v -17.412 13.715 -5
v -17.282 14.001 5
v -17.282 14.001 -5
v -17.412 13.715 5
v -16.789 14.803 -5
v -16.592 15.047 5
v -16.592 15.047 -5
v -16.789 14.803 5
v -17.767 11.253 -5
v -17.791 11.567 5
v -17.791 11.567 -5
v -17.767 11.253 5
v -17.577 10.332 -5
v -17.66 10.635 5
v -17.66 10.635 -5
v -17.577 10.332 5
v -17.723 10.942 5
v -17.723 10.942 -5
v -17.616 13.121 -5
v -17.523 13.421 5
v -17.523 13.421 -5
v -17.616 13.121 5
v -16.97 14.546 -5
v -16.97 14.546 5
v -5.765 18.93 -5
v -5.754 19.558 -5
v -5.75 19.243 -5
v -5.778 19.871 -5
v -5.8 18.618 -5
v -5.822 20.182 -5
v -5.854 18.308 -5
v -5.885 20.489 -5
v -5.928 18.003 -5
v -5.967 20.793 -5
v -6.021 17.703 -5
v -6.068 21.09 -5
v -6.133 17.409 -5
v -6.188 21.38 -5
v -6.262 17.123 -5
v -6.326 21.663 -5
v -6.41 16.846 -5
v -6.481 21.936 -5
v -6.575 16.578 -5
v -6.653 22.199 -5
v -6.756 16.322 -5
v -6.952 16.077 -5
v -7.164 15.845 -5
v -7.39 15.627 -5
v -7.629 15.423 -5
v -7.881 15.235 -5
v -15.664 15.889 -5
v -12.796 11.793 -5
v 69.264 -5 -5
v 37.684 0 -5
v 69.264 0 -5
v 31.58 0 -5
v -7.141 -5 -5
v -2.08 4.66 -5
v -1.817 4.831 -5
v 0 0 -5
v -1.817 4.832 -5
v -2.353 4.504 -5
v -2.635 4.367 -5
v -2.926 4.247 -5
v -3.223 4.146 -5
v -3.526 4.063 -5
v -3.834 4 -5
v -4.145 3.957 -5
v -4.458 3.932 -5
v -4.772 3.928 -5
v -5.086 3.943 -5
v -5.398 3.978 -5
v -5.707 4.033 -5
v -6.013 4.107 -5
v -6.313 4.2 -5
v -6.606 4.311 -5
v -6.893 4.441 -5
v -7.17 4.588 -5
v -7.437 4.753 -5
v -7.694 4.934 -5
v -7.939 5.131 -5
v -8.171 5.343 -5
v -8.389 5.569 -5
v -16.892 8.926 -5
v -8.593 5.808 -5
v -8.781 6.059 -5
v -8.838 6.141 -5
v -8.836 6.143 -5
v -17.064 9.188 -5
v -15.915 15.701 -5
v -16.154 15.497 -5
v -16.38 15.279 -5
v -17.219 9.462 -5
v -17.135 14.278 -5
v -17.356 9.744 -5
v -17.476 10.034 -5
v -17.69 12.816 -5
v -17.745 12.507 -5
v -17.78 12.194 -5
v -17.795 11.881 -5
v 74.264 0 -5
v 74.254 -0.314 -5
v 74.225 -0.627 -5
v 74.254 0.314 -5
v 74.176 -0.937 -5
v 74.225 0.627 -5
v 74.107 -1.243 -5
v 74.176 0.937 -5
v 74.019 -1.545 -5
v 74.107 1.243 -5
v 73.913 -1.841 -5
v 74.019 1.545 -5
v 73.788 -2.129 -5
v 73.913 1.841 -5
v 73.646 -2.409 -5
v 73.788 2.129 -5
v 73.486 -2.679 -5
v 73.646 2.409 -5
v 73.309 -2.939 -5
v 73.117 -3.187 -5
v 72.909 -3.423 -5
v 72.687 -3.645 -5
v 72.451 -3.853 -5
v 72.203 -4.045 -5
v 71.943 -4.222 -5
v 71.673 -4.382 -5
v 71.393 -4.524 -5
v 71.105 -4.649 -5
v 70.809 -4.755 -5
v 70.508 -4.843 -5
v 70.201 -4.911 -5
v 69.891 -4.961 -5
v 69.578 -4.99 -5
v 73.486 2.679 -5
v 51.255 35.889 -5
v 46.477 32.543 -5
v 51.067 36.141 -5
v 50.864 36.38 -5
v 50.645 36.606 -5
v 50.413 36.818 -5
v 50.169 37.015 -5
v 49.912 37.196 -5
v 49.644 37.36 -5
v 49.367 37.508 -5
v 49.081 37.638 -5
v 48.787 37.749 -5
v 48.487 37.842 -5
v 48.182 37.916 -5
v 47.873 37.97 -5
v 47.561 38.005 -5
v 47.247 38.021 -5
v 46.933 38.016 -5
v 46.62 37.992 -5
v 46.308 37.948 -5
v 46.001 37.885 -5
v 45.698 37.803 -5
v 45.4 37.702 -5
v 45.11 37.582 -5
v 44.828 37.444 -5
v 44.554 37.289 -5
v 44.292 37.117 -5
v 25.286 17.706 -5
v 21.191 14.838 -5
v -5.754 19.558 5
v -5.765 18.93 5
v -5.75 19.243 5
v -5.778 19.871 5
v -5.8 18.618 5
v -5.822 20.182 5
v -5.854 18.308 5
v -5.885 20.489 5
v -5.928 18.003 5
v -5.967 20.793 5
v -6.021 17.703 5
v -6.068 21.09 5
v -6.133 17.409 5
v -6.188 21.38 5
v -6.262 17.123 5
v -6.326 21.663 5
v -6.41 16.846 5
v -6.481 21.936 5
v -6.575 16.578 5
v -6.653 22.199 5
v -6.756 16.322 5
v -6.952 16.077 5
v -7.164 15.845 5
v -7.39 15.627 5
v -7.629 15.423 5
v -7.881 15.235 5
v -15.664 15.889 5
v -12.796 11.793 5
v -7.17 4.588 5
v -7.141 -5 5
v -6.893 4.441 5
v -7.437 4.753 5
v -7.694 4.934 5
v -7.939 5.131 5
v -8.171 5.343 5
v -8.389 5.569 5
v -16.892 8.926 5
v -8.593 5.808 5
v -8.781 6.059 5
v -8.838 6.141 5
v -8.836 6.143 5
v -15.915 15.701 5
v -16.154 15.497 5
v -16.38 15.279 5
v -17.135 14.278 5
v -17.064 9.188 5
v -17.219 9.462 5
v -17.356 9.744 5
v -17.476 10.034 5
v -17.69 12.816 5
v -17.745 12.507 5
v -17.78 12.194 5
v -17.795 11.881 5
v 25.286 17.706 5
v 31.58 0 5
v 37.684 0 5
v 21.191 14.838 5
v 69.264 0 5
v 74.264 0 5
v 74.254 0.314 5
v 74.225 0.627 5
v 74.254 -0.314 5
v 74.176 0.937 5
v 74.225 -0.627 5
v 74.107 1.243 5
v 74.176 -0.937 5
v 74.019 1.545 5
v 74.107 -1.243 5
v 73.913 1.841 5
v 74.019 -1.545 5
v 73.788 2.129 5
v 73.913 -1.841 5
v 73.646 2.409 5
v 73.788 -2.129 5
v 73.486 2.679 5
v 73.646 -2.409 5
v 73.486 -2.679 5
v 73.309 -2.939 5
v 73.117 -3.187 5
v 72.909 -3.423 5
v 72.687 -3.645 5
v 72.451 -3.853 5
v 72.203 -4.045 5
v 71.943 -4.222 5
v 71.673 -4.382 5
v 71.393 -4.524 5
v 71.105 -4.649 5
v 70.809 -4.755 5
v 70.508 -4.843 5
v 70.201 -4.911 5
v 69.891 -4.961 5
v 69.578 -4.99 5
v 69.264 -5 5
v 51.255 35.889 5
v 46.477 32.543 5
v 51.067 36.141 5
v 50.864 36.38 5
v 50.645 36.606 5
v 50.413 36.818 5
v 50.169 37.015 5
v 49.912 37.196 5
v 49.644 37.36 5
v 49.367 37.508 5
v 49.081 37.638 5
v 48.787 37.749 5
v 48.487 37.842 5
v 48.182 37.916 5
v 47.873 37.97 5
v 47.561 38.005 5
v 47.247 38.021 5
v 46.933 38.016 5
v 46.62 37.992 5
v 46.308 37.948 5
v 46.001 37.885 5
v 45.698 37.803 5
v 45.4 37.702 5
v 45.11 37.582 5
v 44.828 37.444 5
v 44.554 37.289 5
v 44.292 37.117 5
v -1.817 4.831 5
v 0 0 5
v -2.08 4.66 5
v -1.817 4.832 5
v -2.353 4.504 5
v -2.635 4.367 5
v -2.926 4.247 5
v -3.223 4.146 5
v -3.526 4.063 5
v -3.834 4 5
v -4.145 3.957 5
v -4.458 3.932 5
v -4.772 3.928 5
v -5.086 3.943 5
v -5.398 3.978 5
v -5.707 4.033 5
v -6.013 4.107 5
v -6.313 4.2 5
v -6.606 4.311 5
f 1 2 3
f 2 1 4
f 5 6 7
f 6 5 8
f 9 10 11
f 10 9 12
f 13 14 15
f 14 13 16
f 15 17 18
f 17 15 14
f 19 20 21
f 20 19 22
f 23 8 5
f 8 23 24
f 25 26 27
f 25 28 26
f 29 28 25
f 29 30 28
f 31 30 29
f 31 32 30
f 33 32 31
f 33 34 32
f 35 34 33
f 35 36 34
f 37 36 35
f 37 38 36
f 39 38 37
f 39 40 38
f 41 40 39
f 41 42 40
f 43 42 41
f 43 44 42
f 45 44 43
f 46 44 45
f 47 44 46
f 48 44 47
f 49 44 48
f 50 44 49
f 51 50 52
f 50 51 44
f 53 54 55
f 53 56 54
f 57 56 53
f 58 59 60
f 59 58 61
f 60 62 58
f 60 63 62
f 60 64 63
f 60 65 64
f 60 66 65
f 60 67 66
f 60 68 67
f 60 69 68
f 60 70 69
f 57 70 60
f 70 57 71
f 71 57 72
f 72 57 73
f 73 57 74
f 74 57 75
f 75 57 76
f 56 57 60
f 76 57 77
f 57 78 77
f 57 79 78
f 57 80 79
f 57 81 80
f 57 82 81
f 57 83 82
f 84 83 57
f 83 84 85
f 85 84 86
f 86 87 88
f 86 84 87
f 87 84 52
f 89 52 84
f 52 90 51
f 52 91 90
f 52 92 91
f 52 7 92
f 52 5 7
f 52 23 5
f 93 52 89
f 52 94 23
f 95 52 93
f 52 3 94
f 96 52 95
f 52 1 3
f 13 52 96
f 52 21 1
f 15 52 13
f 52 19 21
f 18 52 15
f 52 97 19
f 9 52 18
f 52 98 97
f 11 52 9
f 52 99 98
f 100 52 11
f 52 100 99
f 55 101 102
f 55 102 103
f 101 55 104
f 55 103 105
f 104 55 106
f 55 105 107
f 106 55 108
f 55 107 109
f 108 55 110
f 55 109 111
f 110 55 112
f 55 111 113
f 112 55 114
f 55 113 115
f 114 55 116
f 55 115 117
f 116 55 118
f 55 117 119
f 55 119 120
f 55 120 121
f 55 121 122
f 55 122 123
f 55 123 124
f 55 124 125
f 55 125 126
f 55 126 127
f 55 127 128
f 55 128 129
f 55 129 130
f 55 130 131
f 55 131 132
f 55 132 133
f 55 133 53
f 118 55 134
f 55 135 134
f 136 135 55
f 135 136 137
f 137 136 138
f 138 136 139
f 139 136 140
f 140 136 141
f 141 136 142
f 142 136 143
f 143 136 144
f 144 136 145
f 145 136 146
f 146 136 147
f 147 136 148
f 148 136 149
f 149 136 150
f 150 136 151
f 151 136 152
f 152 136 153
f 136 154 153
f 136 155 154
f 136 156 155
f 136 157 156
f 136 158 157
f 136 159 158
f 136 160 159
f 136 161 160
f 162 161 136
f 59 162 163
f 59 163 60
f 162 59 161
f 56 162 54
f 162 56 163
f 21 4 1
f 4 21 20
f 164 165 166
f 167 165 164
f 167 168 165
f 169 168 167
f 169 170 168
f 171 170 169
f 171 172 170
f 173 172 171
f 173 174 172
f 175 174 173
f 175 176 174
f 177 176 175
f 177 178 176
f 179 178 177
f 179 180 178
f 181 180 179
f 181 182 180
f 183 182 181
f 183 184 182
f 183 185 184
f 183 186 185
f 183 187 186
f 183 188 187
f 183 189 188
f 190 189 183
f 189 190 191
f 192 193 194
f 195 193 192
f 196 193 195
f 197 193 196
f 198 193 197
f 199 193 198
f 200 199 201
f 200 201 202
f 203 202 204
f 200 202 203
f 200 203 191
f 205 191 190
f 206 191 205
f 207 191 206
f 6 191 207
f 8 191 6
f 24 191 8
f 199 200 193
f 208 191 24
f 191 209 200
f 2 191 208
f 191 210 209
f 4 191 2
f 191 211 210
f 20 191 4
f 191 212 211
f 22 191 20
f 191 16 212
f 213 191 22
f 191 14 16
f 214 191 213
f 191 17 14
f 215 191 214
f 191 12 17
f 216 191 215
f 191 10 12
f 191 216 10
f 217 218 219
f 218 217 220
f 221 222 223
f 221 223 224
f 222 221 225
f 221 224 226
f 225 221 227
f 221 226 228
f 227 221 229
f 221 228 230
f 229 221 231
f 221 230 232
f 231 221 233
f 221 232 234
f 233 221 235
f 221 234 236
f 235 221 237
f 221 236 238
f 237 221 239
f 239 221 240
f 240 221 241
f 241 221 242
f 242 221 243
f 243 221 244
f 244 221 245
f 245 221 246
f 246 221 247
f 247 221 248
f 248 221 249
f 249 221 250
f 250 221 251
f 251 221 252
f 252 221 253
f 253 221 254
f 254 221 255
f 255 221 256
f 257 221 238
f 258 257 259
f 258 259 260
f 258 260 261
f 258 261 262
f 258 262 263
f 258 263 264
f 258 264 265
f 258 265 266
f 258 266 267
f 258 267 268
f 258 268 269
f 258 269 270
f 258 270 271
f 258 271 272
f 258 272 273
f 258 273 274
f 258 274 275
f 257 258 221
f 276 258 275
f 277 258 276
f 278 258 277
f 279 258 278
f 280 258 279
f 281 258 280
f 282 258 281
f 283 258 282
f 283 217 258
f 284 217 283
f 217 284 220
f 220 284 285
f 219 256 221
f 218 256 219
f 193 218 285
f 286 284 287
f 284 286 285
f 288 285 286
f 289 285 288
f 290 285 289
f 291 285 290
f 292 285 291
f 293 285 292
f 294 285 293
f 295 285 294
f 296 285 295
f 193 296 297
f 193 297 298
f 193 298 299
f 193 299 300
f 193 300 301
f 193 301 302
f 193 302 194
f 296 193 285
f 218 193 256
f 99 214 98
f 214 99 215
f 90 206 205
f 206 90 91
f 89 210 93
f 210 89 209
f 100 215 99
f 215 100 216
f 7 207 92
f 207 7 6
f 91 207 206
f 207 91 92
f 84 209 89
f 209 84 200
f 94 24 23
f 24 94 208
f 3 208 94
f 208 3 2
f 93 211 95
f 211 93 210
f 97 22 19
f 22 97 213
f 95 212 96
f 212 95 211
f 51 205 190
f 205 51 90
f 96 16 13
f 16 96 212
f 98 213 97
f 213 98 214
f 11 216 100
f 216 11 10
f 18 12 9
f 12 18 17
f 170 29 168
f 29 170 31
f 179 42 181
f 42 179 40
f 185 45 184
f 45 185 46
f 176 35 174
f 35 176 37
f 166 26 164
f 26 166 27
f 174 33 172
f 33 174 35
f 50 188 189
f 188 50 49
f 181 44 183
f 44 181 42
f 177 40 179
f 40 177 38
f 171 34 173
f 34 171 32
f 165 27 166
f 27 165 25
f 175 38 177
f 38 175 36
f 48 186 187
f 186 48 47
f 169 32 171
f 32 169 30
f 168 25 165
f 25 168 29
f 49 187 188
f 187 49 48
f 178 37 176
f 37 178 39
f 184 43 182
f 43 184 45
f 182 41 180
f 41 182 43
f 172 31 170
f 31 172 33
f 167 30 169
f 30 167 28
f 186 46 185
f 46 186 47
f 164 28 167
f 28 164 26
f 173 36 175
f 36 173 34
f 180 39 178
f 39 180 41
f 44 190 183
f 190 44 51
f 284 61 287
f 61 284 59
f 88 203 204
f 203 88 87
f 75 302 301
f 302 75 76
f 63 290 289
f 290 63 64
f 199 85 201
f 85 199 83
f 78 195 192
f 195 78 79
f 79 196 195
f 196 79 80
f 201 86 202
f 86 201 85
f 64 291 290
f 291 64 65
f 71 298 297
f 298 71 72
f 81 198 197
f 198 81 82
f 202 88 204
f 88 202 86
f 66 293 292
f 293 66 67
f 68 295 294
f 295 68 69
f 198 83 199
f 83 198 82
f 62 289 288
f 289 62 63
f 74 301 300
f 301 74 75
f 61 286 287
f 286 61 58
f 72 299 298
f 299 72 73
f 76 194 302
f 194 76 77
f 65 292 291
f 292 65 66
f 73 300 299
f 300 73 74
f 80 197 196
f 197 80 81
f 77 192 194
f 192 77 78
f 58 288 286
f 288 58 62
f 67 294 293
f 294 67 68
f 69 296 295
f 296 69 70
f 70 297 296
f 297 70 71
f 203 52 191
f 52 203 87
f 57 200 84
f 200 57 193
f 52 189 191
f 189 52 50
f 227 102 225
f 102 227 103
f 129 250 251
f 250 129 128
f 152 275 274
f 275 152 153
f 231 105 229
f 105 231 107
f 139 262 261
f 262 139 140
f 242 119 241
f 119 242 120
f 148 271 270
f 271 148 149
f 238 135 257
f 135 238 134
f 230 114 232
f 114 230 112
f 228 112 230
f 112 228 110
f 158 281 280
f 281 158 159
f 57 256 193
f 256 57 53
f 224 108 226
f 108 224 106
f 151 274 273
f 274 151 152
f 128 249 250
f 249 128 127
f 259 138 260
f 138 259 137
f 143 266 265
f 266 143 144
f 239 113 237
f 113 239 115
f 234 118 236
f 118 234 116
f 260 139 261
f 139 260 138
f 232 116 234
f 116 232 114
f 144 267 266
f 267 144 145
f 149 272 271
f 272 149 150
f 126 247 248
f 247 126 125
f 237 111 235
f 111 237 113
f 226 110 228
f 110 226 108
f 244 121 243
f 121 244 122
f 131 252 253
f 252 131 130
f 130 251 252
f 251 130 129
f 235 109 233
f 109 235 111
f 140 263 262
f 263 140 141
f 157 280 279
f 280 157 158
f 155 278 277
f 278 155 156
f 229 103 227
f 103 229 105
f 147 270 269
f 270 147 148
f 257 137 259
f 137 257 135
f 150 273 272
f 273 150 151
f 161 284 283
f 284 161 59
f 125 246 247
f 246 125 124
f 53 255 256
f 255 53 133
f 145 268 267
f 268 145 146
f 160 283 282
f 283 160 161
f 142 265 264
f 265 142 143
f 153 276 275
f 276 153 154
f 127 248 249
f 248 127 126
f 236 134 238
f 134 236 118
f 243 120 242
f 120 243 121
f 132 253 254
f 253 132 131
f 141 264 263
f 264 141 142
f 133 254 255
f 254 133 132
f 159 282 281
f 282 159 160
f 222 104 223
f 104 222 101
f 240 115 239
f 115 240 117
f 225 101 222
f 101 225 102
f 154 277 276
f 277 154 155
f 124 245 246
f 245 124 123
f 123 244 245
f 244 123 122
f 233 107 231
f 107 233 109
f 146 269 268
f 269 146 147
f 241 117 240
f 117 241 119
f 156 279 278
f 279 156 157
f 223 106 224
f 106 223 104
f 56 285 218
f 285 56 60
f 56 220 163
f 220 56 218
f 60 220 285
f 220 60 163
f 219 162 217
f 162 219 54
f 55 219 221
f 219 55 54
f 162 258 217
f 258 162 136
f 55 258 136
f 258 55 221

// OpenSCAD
$fn=100;

*translate(-[ 18.45, 25.08, 70 ])import("GeomStandBig.stl");



//configure     default Vals MacBook Retina 15"
//roundings = 5;  //  5 
//Wall thickness (mm)
wallThick = 5;  // [2:8]

//Angle (Deg)
angleDeg = 35;  // [15:50]

//Deepnes of the base(mm)
baseDeep = 220; // 

//Width of the Stand(mm)
standWidth = 10;// [2:20]

//Spacing of the Hook(mm)
hookSpace = 12; // [5:20]

// Length of the Hook(mm). Zero = No Hook
hookLen = 6;   // [30]

/* [Hidden] */
fudge = 0.1;    //0.1

subDivs = 6;

surfaceLen = cos(angleDeg) * baseDeep;
topXCord = pow(surfaceLen,2)/baseDeep;
topYCord = sqrt((baseDeep-topXCord)*topXCord);


fieldWdth = (surfaceLen-(subDivs-1)*wallThick)/subDivs;
echo(surfaceLen,fieldWdth);
echo(norm([ 144.02, 100.45, 5.00 ]));

// triangle calculations
// tan alpha = GK/AK
// cos alpha = AK/HYP
// sin alpha = GK/HYP
// b²=c*q
// a²+b²=c²
dFieldWdth = fieldWdth*2+wallThick; //double field width (adjactence side)
GK = tan(angleDeg)*fieldWdth; //opposite width of triangle to remove

dGK = tan(angleDeg)* dFieldWdth; //opposite width of the large triangle
dAK = dFieldWdth;
dHYP = dGK / sin(angleDeg); //hypotenuse width of large triangle

HYP1 = sqrt(pow(fieldWdth,2)+pow(GK,2)); //The hypotenuse of the triangle to remove
HYP2 = wallThick / cos(angleDeg);  //the hypotenuse of the small wall base, width to next triangle
GK2 = sqrt(pow(HYP2,2)-pow(wallThick,2)); //opposite width of the small tri at the base f the wall
GK3 = sin(angleDeg)*wallThick; //opposite width of small tri at the rightmost triangle
AK3 = cos(angleDeg)*wallThick;

GK4 = wallThick-AK3+fudge; //very small Tri at opener
HYP4 = GK4/sin(angleDeg);
AK4 = cos(angleDeg) * HYP4;

AK5 = GK4;
HYP5 = AK5/cos(angleDeg);

Hg = sin(angleDeg)*dFieldWdth;
q = Hg+wallThick/tan(angleDeg);
echo(GK3);
    

//base geometry
//big one
*difference(){
union(){
    hull(){
        cylinder(h=standWidth,r=wallThick, center=true);
        translate ([baseDeep,0,0]) 
            cylinder(h=standWidth,r=wallThick, center=true);
        translate ([topXCord,topYCord,0]) 
            cylinder(h=standWidth,r=wallThick, center=true);
    }

    //get translation for the hook in X dir
    AK=wallThick/tan(angleDeg);

    translate([-AK,-wallThick,-standWidth/2])
        rotate([0,0,angleDeg])       
            hook();
    translate([-AK,-wallThick,-standWidth/2]) 
        cube([AK,wallThick,standWidth]);
}


// now the recesses 
//polys
    //#1
    rotate([0,0,angleDeg]) linear_extrude(height=standWidth+fudge,center=true) polygon([[0,0],[fieldWdth,0],[fieldWdth,-GK]]);
    //#2 (tri+quad)
    translate ([HYP1+HYP2,0,0]) 
        rotate([0,0,angleDeg]) 
        linear_extrude(height=standWidth+fudge,center=true) 
            polygon([[0,0],[0,GK+GK2],[fieldWdth,GK+GK2],[fieldWdth,0],[fieldWdth,-GK]]);
    //#3 (double, opens at bottom)
    //#translate ([(HYP1+HYP2)*2+GK3,-AK3,0]) 
    translate ([(HYP1+HYP2)*2+GK3-AK4,-wallThick-fudge,0]) 
        rotate([0,0,angleDeg]) 
        linear_extrude(height=standWidth+fudge,center=true) 
            polygon([[0,0],[dFieldWdth+AK4,0],[dFieldWdth+AK4,-dGK-HYP5]]);

    //#4 (double)
    translate ([(HYP1+HYP2)*4,0,0]) rotate([0,0,angleDeg]) 
        linear_extrude(height=standWidth+fudge,center=true) 
            polygon([[0,0],[dFieldWdth,0],[dFieldWdth,-dGK]]);
            
//now the rectangles
    recDepth2=2*(GK+GK2);
    //#1
    translate([(HYP1+HYP2)*2,0,-(standWidth+fudge)/2])
        rotate([0,0,angleDeg]) cube([dFieldWdth,(recDepth2-wallThick)/2,standWidth+fudge]);
    //#2
    translate([(HYP1+HYP2)*2,0,-(standWidth+fudge)/2])
        rotate([0,0,angleDeg]) 
            translate([0,(recDepth2-wallThick)/2+wallThick,0])cube([dFieldWdth,(recDepth2-wallThick)/2,standWidth+fudge]);
    //#3
    translate([(HYP1+HYP2)*4,0,-(standWidth+fudge)/2])rotate([0,0,angleDeg]) 
        translate([0,dGK+GK2,0])cube([fieldWdth,recDepth2,standWidth+fudge]);
        
 
    //#4
    translate([(HYP1+HYP2)*5,0,-(standWidth+fudge)/2])rotate([0,0,angleDeg]) 
        translate([0,dGK+GK2+GK+GK2,0])cube([fieldWdth,recDepth2,standWidth+fudge,]);
        
    //#5
    translate([(HYP1+HYP2)*4-GK3,AK3,-(standWidth+fudge)/2]) rotate([0,0,angleDeg]) 
        translate([0,0,0])cube([fieldWdth*2+wallThick,2*GK-GK2,standWidth+fudge,]);
   
    
}
// the small one

    difference(){
        union(){
            hull(){
                cylinder(h=standWidth,r=wallThick, center=true);
                translate ([2*HYP1+HYP2,0,0]) 
                    cylinder(h=standWidth,r=wallThick, center=true);
                rotate([0,0,angleDeg])
                translate ([surfaceLen*(2/subDivs)-wallThick/2,0,0]) 
                    cylinder(h=standWidth,r=wallThick, center=true);
            }

            //get translation for the hook in X dir
            AK=wallThick/tan(angleDeg);

            translate([-AK,-wallThick,-standWidth/2])
                rotate([0,0,angleDeg])       
                    hook();
            translate([-AK,-wallThick,-standWidth/2]) 
                cube([AK,wallThick,standWidth]);
        }
        //#1
        rotate([0,0,angleDeg]) linear_extrude(height=standWidth+fudge,center=true) polygon([[0,0],[fieldWdth,0],[fieldWdth,-GK]]);
        
        //#2 (tri+quad)
        translate ([HYP1+HYP2,0,0]) 
            rotate([0,0,angleDeg]) 
            linear_extrude(height=standWidth+fudge,center=true) 
                polygon([[0,0],[0,GK+GK2],[fieldWdth,GK+GK2],[fieldWdth,0],[fieldWdth,-GK]]);
    }


module hook(){

    union(){
        cube([wallThick,hookSpace+wallThick,standWidth]);
        translate([wallThick,hookSpace+wallThick,0])
            intersection(){
                cylinder(h=standWidth,r=wallThick, center=false);
                translate([-wallThick-fudge,0,-fudge/2]) cube([wallThick+fudge,wallThick+fudge,standWidth+fudge]);
            }
        if (hookLen) translate([wallThick,hookSpace+wallThick,0]) cube([hookLen,wallThick,standWidth]);
        if (hookLen) translate([wallThick+hookLen,hookSpace+wallThick*2,0]) 
            intersection(){
            cylinder(h=standWidth,r=wallThick, center=false);
                translate([0,-wallThick-fudge,-fudge/2]) cube([wallThick+fudge,wallThick+fudge,standWidth+fudge]);
            }
        translate([wallThick*2,2*wallThick,0]) 
            difference(){
                translate([-wallThick-fudge,-2*wallThick,0]) cube([wallThick+fudge,2*wallThick+fudge,standWidth]);
                translate([0,0,-fudge/2]) cylinder(h=standWidth+fudge,r=wallThick, center=false);
            }
    }
}
